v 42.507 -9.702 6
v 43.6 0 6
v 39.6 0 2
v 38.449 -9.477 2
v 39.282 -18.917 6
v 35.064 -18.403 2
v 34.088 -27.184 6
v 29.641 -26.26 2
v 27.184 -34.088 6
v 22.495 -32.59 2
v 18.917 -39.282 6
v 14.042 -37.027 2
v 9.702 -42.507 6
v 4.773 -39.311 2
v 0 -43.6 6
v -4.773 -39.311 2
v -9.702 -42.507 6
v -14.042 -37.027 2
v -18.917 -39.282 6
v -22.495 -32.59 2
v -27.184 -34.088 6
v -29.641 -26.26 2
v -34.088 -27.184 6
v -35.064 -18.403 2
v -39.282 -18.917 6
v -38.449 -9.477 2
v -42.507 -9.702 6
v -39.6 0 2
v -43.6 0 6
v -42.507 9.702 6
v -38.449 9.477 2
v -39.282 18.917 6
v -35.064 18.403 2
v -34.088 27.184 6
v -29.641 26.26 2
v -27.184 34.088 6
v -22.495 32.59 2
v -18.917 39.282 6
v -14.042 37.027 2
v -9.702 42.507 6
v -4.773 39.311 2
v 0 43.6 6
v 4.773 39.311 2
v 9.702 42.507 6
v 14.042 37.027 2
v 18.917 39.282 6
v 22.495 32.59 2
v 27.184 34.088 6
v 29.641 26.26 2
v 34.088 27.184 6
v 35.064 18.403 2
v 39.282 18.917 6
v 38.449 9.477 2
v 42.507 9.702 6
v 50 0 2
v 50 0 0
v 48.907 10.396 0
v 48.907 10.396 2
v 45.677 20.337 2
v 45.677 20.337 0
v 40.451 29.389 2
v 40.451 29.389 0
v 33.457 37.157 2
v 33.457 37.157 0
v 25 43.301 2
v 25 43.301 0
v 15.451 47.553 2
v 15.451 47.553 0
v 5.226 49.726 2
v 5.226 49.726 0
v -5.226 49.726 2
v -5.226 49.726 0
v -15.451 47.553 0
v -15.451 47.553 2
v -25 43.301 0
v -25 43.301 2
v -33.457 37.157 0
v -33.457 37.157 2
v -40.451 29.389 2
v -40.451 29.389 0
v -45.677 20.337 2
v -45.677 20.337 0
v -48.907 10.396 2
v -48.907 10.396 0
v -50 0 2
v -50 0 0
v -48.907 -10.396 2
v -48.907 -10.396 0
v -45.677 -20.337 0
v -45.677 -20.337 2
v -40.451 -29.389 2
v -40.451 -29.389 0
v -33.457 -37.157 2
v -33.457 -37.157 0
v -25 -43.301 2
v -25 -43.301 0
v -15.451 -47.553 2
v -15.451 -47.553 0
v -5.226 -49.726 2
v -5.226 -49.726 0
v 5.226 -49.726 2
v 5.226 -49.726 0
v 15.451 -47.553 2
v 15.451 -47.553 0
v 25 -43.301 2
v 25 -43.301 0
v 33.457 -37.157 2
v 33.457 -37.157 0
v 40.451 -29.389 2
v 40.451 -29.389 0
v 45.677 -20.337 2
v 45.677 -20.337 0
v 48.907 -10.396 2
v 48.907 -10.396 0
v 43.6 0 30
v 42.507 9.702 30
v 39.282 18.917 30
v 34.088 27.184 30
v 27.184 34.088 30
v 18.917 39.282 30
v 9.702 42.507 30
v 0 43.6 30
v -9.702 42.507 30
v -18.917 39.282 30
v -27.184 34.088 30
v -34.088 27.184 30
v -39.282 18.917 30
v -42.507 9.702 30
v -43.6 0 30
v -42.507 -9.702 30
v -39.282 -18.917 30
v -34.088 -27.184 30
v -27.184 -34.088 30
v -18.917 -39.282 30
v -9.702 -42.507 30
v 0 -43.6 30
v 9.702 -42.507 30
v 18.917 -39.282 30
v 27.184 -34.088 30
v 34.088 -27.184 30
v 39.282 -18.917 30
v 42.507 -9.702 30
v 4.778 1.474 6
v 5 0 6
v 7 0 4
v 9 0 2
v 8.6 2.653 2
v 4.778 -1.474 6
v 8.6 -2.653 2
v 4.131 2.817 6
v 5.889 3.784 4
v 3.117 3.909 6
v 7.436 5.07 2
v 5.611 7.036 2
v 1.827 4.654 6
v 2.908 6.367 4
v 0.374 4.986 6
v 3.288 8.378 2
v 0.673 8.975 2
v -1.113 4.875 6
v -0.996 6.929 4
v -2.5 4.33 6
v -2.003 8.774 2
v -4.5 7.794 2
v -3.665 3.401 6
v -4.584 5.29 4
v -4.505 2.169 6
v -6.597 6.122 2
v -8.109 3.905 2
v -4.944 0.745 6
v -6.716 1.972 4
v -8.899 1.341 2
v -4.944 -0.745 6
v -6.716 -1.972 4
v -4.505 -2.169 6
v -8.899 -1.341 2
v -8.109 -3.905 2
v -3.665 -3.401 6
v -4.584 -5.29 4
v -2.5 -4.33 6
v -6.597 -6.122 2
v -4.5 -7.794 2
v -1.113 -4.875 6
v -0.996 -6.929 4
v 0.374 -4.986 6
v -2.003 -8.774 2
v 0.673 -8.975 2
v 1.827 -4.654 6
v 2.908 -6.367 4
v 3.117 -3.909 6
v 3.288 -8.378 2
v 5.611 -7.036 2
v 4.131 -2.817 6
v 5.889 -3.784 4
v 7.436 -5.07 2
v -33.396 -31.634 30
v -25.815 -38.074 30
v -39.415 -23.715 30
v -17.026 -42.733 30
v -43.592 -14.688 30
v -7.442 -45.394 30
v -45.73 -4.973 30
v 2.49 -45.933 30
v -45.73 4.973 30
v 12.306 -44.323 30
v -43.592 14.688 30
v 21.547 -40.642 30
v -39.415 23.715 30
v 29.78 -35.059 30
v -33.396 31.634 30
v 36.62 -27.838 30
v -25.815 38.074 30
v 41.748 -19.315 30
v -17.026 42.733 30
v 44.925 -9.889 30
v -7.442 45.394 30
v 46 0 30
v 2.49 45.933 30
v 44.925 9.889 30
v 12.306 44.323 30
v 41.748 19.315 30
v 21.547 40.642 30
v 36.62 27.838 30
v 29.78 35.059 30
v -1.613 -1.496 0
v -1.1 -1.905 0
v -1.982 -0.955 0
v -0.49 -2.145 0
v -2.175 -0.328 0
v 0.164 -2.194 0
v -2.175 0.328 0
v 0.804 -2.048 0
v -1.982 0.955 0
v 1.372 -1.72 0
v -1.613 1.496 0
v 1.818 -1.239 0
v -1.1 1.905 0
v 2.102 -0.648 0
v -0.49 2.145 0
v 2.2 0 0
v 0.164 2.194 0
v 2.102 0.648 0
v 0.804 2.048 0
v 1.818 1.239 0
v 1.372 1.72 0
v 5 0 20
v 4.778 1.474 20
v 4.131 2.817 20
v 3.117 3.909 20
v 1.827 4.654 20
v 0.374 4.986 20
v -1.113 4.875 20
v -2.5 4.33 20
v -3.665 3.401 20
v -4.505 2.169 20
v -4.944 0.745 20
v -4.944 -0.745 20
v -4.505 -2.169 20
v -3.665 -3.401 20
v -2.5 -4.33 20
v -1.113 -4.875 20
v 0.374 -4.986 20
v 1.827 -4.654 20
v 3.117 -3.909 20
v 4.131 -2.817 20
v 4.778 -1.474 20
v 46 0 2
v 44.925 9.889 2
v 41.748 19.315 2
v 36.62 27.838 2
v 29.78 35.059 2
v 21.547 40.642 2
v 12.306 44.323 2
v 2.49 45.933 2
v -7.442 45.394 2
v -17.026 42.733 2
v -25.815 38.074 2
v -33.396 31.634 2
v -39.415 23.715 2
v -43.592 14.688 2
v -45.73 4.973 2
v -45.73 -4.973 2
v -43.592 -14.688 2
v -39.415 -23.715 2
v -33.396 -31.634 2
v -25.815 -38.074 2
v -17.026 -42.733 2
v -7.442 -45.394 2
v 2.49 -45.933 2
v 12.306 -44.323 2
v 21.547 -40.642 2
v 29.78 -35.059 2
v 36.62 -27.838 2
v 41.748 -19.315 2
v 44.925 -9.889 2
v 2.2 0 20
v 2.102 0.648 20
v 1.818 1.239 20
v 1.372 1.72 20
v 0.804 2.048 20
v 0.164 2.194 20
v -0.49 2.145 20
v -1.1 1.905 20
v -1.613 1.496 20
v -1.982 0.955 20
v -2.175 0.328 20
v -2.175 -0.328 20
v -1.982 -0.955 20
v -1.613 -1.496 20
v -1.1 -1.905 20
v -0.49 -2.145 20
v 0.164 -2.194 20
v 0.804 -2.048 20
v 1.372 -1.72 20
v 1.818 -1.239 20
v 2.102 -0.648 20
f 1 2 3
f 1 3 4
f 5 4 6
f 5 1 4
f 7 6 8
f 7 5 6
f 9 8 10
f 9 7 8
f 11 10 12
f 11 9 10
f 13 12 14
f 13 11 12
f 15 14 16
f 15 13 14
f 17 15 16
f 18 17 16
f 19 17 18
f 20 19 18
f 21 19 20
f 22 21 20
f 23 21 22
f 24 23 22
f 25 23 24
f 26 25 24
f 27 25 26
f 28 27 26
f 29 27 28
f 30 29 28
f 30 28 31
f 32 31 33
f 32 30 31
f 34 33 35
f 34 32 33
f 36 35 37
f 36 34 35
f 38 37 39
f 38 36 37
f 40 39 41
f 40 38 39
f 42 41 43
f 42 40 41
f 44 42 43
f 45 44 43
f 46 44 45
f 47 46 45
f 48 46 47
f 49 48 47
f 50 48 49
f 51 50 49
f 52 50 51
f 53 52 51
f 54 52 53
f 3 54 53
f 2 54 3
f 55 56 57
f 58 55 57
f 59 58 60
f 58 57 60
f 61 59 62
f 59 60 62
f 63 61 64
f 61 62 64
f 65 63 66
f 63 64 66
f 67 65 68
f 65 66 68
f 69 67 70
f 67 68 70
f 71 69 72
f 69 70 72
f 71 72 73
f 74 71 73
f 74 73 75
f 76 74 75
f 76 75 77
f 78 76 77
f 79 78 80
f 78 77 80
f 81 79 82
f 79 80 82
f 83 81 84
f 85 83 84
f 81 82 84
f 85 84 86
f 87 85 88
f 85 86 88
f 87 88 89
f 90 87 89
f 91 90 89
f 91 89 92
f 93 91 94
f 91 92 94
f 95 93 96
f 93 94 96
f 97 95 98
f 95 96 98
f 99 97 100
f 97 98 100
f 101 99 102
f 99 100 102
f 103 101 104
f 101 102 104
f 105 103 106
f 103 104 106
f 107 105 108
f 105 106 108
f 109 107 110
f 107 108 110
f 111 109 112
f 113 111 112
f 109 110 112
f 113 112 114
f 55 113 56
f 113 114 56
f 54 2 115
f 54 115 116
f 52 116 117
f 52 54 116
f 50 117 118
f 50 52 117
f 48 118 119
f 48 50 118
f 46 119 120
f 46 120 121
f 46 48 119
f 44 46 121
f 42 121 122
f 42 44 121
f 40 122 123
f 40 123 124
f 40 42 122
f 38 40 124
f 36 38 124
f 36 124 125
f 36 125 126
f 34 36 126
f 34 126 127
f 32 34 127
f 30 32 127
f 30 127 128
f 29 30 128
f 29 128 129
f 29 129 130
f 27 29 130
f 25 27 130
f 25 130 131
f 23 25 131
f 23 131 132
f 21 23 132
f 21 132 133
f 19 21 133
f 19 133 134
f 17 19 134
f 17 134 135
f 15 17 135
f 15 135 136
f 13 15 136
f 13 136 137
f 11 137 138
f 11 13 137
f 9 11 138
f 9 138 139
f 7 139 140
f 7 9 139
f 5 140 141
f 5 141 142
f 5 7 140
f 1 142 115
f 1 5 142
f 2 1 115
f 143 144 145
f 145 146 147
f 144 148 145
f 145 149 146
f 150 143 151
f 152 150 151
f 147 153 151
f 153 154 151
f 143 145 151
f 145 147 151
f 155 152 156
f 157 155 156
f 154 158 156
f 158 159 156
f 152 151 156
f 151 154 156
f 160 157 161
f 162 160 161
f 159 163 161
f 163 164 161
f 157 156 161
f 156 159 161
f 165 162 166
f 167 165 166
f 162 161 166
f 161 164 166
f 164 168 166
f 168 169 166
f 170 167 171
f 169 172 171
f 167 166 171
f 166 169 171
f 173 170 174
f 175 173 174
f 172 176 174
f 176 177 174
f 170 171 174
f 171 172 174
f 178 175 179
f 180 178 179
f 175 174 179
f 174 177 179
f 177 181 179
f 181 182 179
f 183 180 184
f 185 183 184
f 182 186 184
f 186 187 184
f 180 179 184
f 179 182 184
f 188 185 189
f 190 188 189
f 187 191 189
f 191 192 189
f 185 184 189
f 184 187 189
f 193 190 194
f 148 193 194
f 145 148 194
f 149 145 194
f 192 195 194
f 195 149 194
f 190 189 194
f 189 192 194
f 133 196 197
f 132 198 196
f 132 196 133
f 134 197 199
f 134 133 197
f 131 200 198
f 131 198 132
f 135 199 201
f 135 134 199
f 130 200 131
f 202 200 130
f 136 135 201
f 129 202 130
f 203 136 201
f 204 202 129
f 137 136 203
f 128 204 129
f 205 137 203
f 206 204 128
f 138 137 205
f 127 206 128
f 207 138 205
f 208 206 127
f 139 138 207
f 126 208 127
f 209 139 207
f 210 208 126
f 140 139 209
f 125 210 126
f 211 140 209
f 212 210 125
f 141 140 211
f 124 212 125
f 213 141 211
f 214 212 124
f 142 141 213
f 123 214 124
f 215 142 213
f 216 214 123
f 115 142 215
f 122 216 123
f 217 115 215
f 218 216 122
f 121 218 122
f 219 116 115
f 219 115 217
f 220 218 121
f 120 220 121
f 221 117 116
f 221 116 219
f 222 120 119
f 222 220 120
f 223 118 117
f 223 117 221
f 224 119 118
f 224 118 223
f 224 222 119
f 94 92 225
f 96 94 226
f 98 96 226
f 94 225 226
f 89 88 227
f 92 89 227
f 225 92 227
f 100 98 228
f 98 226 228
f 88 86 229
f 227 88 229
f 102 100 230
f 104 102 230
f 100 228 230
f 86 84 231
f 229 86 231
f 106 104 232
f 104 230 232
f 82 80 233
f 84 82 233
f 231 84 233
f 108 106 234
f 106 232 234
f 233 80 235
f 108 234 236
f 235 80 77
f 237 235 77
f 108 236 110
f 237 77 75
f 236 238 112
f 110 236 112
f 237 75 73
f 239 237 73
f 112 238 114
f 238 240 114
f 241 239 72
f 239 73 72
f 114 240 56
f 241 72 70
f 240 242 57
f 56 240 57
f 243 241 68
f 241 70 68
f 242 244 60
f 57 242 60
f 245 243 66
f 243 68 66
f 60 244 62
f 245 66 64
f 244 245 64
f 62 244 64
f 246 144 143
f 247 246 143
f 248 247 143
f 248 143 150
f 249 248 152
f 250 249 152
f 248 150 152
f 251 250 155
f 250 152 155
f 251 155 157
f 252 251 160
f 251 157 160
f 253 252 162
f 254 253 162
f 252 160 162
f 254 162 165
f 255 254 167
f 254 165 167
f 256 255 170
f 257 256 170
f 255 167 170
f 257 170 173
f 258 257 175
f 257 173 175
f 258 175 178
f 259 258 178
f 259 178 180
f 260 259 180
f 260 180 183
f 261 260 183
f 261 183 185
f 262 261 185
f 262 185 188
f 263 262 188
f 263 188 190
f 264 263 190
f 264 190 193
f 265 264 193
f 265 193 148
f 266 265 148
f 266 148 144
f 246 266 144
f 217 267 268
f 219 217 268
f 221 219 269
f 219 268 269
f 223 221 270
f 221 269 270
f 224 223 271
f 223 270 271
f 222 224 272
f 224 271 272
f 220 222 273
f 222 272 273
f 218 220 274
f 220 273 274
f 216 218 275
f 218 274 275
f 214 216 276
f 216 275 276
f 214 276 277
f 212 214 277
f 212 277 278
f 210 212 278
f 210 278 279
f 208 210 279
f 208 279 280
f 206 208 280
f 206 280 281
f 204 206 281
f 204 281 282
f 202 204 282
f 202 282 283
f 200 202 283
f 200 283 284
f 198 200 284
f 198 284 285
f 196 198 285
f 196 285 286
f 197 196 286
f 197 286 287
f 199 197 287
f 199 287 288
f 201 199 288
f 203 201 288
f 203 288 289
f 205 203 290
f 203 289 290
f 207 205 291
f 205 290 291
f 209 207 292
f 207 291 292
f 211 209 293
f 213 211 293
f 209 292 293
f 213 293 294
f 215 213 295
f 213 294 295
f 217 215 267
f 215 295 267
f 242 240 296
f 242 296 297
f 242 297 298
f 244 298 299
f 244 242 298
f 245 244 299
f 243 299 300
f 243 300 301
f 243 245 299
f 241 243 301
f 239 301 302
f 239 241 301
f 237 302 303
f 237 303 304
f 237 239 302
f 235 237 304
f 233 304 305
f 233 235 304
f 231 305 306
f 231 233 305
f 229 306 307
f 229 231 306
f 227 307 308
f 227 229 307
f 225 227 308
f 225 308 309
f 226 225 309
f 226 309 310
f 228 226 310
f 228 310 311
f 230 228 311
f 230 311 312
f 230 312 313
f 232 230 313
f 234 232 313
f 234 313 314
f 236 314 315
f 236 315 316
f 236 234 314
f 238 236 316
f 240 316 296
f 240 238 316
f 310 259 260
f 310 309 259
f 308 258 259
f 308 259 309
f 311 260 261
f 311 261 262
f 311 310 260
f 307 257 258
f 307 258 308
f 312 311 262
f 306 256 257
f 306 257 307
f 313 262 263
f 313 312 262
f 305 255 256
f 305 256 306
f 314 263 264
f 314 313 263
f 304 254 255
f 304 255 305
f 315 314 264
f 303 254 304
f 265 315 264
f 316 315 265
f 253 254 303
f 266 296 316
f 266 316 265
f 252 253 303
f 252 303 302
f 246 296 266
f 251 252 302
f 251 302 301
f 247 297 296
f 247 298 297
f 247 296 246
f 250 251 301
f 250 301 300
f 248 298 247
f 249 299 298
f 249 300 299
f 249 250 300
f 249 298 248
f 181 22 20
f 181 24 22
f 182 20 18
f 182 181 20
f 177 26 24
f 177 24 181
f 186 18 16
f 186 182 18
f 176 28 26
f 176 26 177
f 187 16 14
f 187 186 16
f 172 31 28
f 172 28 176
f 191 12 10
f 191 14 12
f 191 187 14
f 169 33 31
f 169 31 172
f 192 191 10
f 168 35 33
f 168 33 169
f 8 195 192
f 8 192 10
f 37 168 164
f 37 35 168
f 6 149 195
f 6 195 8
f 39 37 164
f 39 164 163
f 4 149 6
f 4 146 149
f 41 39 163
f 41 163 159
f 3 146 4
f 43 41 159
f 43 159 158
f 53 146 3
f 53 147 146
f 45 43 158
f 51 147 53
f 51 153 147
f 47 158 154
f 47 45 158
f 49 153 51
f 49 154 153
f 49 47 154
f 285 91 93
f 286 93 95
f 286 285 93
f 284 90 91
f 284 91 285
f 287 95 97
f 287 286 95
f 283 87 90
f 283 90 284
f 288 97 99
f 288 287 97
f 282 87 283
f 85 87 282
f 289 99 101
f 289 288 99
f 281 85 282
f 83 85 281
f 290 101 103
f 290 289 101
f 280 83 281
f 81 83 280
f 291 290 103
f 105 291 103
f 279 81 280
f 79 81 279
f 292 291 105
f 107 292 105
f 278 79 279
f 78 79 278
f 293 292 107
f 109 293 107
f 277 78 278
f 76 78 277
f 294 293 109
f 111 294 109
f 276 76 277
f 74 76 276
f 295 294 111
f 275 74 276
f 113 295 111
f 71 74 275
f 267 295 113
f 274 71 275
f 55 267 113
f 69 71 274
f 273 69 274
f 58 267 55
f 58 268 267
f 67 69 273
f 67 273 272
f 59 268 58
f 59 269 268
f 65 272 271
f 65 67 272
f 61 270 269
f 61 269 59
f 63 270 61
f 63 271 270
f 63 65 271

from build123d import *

# Parameters (mm, degrees)
F0_R     = 50
F0_R_2   = 46
F0_R_3   = 43.6
F0_R_4   = 5
F1_DEPTH = 2
F2_DEPTH = 30
F0_R_5   = 2.2
F3_DEPTH = 20
F4_SIZE  = 4


with BuildPart() as f1:
    # F0 (on Top) → F1 (new body)
    with BuildSketch(Plane.XY):
        Circle(F0_R)
        Circle(F0_R_2, mode=Mode.SUBTRACT)
        Circle(F0_R_2)
        Circle(F0_R_3, mode=Mode.SUBTRACT)
        Circle(F0_R_3)
        Circle(F0_R_4, mode=Mode.SUBTRACT)
    extrude(amount=F1_DEPTH)

    # F0 (on Top) → F2 (join)
    with BuildSketch(Plane.XY):
        Circle(F0_R_2)
        Circle(F0_R_3, mode=Mode.SUBTRACT)
    extrude(amount=F2_DEPTH)

    # F0 (on Top) → F3 (join)
    with BuildSketch(Plane.XY):
        Circle(F0_R_4)
        Circle(F0_R_5, mode=Mode.SUBTRACT)
    extrude(amount=F3_DEPTH)

    # F4
    f4_edges = [f1.edges().sort_by_distance(p)[0] for p in [
        (-5, 0, 2),
        (-43.6, 0, 2),
    ]]
    chamfer(f4_edges, length=F4_SIZE)


solid = f1.part
